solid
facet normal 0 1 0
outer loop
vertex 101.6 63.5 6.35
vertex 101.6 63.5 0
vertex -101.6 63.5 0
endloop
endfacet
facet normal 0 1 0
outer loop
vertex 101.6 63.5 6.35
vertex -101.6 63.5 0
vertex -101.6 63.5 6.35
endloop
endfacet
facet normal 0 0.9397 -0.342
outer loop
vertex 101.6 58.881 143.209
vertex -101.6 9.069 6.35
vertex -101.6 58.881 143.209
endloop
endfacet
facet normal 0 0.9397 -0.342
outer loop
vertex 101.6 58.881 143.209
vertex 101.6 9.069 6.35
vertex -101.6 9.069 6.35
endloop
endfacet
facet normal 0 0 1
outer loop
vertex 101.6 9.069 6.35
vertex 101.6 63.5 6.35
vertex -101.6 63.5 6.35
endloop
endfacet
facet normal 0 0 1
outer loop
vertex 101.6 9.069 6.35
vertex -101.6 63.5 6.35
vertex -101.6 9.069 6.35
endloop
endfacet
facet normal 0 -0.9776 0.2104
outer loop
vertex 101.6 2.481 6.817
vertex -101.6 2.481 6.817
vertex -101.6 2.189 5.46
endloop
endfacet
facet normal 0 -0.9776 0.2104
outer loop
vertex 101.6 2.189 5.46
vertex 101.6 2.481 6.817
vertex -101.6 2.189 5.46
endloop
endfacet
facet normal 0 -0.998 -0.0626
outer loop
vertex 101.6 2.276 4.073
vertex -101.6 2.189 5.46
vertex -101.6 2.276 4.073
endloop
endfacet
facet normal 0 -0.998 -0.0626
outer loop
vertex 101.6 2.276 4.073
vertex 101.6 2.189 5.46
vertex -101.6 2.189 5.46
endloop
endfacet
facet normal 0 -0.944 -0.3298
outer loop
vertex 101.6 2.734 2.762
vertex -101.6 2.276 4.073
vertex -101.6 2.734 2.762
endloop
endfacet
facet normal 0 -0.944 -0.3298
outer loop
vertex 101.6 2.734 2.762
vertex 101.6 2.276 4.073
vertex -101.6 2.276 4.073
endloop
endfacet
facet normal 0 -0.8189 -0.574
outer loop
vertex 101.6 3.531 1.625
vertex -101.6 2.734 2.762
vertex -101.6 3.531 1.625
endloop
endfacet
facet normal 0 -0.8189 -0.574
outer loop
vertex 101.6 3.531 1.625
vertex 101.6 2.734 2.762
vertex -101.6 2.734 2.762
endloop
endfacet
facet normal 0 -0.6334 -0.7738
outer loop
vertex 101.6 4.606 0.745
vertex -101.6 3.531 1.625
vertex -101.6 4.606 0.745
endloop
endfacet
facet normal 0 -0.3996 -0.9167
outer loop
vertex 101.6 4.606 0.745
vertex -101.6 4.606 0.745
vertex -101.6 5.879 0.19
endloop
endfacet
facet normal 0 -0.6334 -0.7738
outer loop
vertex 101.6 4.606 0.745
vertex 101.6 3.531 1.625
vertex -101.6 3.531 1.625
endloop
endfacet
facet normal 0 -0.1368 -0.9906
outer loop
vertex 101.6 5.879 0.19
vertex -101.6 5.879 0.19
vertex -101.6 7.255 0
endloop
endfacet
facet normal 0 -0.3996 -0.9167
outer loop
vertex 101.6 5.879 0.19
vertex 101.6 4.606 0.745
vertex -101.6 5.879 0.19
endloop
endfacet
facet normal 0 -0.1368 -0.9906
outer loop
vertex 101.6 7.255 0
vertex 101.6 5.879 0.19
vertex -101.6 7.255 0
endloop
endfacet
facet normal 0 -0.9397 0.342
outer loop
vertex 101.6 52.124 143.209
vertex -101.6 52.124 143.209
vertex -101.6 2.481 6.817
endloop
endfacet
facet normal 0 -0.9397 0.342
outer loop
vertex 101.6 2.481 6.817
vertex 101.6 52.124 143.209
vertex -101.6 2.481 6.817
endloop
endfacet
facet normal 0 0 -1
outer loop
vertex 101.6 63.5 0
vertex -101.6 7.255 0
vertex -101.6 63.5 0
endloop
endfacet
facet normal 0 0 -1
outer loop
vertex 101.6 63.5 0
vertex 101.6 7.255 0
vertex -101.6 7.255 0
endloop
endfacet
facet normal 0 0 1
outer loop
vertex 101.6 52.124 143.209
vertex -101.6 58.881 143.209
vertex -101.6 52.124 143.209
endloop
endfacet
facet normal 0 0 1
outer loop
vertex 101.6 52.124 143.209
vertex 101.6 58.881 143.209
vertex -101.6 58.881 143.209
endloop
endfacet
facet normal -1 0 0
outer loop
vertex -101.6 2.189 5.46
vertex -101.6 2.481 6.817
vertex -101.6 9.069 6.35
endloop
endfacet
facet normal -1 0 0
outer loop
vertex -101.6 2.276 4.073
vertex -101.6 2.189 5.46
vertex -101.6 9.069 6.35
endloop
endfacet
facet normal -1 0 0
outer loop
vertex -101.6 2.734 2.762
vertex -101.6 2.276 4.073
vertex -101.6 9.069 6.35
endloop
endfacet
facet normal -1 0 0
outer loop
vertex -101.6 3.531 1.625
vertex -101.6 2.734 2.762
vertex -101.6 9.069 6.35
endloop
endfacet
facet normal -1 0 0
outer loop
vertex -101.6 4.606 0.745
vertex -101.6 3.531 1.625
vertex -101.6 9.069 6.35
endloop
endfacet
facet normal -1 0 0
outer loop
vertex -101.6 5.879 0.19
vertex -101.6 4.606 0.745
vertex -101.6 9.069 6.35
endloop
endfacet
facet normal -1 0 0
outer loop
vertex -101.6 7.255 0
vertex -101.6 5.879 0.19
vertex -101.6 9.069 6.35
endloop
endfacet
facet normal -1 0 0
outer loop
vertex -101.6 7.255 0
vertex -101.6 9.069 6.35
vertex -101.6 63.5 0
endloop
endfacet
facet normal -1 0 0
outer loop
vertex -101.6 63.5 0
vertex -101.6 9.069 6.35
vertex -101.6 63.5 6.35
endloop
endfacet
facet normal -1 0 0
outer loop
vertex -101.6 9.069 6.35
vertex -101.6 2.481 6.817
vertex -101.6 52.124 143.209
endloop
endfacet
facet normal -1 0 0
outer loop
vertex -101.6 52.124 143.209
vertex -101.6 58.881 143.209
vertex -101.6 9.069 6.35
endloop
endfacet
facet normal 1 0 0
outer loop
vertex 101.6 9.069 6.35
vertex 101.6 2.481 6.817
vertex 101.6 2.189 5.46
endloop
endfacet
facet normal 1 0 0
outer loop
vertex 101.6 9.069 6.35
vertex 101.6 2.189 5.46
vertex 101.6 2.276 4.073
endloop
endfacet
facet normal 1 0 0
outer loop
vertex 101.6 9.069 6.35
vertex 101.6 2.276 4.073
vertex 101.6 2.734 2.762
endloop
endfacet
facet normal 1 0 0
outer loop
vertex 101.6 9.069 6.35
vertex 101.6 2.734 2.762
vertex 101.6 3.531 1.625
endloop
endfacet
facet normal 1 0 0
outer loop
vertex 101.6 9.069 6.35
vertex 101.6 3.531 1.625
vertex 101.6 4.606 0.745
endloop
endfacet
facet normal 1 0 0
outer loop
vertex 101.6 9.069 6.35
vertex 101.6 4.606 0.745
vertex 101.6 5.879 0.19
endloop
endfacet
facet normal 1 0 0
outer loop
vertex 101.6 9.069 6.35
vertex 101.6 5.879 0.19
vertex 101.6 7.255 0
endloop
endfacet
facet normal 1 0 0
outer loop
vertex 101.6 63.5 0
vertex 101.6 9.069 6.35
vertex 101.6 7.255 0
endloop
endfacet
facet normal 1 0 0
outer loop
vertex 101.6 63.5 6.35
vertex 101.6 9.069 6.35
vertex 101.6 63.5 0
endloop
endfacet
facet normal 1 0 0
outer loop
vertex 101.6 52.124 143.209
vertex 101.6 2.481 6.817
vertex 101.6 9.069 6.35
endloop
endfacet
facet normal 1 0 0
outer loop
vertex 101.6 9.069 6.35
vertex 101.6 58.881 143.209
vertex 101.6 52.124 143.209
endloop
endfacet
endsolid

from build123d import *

# Parameters (mm, degrees)
F1_DEPTH = 101.6
F2_R     = 5.08


with BuildPart() as f1:
    # F0 (on Right) → F1 (new body, symmetric)
    with BuildSketch(Plane.YZ):
        Polygon((52.1238698428, 143.2091554078), (0, 0), (63.5, 0), (63.5, 6.3499992049), (9.0687387073, 6.3499992049), (58.8813978519, 143.2091554078), align=None)
    extrude(amount=F1_DEPTH, both=True)

    # F2
    f2_edges = [f1.edges().sort_by_distance(p)[0] for p in [
        (0, 0, 0),
    ]]
    fillet(f2_edges, radius=F2_R)


solid = f1.part
